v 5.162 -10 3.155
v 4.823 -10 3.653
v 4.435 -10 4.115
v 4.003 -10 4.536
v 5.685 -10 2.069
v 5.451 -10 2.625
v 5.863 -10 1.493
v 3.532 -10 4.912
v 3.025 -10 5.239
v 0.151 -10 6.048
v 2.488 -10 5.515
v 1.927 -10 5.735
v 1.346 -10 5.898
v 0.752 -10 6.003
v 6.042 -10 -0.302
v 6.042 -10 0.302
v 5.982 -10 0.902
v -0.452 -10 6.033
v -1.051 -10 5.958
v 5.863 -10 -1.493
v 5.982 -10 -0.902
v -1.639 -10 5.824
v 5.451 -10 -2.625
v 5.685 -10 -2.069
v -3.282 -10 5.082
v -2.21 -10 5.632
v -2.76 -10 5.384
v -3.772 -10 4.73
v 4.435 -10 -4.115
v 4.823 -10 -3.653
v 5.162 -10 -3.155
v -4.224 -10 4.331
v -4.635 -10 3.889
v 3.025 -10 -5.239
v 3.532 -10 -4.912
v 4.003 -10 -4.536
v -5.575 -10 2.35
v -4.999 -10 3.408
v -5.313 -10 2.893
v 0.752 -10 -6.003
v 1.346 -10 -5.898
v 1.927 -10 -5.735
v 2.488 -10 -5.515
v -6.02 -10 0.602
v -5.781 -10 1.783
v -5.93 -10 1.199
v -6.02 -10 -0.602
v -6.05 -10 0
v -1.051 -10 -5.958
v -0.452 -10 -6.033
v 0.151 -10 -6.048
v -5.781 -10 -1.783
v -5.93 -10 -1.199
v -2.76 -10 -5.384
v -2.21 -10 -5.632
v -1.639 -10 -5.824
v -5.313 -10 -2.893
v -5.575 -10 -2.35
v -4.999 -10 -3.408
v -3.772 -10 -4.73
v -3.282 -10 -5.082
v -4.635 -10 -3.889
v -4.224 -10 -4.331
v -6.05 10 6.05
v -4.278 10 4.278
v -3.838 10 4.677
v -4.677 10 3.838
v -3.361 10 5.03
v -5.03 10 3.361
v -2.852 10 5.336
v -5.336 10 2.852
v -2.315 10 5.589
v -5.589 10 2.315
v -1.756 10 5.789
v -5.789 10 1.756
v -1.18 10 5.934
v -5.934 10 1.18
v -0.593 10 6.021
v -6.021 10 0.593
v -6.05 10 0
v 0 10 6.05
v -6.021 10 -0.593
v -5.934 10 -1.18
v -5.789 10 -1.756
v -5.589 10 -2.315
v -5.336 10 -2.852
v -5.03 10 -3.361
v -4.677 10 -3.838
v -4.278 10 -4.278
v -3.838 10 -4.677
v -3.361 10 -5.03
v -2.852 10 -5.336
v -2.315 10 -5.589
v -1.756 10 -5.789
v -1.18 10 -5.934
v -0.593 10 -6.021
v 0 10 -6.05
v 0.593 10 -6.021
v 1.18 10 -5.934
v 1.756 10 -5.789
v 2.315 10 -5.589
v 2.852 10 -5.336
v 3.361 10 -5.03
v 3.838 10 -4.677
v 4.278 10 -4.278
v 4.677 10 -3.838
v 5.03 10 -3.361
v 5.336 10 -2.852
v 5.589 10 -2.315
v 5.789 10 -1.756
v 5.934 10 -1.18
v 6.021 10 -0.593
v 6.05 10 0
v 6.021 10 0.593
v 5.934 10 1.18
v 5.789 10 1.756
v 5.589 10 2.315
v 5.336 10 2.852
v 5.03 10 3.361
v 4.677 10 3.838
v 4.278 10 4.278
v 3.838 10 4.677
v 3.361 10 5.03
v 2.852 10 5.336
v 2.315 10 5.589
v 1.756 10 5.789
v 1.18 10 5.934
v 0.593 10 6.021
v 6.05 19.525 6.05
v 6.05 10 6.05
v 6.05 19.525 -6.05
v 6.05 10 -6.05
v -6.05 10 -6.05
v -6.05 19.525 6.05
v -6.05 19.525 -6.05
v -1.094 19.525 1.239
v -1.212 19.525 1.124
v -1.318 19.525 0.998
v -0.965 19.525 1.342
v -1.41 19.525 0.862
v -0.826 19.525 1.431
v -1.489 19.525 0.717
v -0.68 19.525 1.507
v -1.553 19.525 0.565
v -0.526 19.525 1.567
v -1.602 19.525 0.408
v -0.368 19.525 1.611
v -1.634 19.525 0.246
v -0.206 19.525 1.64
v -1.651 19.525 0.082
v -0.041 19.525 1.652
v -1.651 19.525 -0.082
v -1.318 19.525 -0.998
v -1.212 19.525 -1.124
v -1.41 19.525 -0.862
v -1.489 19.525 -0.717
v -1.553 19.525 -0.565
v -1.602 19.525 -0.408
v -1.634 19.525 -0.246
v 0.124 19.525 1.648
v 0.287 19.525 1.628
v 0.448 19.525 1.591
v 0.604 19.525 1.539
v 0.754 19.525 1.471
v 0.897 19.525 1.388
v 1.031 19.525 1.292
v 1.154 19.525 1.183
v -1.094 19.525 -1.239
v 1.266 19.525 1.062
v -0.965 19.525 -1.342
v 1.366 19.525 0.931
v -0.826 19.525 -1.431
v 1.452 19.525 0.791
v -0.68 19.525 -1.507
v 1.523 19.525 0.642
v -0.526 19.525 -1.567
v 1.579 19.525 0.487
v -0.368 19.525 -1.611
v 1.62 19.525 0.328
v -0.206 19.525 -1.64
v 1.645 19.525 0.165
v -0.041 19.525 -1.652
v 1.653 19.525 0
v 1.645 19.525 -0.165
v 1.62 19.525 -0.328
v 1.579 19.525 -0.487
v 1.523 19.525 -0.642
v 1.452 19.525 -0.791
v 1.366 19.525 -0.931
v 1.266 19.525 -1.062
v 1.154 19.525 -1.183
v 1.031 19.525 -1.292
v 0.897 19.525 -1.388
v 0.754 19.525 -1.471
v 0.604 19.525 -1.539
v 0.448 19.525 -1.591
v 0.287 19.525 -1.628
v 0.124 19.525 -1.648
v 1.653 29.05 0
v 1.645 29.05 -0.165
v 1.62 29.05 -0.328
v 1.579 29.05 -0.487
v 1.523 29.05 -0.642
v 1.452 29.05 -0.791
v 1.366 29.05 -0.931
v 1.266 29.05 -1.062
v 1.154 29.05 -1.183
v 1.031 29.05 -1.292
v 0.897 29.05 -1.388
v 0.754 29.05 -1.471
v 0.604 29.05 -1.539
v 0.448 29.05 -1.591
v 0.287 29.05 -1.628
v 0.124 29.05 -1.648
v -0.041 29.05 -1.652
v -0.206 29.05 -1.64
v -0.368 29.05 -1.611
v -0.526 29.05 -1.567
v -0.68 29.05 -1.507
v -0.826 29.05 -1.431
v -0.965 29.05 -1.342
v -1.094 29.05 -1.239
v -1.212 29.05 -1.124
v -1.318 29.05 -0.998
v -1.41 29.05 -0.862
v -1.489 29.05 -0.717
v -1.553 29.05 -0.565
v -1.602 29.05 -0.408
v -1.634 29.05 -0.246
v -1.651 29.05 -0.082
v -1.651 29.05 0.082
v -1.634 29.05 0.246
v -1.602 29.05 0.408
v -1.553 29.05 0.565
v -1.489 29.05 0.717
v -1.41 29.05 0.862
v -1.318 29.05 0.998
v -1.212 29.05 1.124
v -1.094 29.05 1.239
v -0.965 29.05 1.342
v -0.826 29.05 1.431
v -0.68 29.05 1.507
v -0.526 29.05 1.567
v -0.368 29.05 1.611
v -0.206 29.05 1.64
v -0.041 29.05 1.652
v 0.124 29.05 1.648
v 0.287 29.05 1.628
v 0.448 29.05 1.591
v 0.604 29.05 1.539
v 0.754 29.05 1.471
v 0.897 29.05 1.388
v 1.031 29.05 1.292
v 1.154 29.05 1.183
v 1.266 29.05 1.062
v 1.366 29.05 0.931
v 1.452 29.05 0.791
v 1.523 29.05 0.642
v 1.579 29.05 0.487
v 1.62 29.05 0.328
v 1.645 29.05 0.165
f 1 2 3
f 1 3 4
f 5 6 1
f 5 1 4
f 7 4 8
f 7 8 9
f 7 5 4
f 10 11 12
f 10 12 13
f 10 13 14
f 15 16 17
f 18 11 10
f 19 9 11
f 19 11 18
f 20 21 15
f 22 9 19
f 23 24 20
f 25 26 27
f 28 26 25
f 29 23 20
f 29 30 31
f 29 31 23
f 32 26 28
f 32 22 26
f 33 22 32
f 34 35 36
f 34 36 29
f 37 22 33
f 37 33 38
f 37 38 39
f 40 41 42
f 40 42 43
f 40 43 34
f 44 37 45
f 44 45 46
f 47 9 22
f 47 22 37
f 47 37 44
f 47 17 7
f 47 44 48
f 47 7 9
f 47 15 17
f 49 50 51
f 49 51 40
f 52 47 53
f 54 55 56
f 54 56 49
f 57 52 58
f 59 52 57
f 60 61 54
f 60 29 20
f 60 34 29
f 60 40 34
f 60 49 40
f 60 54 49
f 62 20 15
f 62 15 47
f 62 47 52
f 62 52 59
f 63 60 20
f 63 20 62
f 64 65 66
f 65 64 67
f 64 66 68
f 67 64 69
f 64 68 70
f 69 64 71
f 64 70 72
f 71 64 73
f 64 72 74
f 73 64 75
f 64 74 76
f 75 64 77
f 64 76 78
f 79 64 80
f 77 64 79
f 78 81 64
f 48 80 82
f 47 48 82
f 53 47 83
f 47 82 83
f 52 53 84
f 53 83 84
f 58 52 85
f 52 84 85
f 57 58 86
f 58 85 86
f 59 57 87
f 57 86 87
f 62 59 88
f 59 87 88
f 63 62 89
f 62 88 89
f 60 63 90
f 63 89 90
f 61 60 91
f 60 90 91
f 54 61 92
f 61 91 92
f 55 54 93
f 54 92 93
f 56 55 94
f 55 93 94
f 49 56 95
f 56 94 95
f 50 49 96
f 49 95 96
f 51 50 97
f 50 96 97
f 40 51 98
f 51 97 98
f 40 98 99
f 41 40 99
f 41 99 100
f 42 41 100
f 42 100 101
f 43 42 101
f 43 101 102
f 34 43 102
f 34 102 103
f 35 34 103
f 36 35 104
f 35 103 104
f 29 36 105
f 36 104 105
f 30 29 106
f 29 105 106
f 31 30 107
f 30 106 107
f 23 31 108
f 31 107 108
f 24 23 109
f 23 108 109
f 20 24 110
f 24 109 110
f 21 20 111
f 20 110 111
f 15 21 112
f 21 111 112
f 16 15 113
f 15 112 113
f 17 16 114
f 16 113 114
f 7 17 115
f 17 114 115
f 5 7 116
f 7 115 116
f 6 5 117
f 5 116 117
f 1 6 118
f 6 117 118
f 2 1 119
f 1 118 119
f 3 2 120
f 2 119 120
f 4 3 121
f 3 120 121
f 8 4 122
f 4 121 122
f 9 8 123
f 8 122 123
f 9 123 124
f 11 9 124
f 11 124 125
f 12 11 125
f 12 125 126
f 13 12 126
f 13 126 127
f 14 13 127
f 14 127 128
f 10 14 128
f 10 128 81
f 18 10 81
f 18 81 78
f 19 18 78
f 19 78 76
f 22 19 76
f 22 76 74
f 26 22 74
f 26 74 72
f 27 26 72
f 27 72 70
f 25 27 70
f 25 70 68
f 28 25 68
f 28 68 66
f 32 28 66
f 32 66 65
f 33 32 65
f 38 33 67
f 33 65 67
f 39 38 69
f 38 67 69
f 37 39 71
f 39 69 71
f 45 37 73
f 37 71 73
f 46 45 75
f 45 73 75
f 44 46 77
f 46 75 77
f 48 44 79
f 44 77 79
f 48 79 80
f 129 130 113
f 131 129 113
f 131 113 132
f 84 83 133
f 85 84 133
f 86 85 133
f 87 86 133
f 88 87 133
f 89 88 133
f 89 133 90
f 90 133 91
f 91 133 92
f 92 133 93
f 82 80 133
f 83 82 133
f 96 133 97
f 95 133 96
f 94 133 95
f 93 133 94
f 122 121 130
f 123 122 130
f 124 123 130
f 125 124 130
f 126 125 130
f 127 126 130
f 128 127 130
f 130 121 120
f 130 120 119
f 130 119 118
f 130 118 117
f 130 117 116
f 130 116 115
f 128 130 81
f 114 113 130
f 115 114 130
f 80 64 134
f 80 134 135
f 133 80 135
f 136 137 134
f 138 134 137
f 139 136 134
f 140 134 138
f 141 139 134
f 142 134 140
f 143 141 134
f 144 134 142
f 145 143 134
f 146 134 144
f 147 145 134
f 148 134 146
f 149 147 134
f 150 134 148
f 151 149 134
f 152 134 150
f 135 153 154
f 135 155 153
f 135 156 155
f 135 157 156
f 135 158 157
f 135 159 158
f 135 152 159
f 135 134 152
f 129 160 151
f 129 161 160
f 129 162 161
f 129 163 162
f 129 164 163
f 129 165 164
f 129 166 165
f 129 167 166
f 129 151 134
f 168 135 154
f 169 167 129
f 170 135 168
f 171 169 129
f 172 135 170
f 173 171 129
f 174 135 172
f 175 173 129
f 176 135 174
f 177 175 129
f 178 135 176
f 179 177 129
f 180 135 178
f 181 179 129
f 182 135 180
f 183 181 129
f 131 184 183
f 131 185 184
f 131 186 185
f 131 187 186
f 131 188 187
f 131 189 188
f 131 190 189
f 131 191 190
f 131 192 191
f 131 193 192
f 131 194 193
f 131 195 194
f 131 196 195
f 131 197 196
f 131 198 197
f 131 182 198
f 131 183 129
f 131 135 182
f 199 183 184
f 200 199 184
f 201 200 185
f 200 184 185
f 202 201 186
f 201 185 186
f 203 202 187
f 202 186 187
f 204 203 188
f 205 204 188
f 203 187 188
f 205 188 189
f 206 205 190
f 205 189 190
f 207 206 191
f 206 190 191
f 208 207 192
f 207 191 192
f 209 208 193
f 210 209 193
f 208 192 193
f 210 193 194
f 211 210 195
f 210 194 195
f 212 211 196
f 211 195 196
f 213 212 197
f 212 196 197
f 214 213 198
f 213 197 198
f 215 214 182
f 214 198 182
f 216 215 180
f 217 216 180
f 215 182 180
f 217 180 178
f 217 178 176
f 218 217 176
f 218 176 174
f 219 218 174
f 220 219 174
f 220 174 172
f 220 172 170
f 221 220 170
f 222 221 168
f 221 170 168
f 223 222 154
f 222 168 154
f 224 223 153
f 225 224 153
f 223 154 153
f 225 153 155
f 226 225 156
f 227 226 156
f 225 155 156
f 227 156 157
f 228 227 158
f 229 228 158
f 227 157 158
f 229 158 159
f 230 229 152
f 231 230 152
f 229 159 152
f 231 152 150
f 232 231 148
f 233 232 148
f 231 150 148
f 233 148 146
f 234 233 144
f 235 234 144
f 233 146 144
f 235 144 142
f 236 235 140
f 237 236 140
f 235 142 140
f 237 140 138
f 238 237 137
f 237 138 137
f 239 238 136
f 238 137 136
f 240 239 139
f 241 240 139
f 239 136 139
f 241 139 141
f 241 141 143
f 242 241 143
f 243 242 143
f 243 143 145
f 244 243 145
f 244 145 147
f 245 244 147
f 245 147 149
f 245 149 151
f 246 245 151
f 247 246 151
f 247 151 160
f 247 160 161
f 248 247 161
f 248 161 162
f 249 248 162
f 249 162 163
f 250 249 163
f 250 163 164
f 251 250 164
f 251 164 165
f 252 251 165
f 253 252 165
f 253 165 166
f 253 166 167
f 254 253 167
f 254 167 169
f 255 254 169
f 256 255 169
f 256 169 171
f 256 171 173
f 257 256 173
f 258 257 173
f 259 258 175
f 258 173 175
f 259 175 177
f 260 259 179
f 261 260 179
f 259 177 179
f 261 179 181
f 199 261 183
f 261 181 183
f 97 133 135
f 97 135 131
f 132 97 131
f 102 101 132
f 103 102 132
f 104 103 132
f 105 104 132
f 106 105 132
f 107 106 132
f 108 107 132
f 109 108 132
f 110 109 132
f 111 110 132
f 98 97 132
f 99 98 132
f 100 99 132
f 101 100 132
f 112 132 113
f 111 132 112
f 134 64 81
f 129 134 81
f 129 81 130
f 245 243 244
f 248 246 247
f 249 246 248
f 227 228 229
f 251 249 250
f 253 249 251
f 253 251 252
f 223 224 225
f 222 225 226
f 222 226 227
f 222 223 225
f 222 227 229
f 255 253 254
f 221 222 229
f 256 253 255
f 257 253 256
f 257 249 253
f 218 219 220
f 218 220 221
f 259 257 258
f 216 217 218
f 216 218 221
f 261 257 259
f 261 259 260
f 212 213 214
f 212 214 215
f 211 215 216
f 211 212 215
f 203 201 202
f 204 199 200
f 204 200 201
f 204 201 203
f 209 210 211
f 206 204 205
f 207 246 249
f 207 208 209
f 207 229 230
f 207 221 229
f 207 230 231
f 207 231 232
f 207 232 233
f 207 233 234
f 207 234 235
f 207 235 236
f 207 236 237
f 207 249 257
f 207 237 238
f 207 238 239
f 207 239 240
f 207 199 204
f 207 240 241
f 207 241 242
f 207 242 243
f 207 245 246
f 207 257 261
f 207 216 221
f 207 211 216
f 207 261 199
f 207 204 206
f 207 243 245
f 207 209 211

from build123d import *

# Parameters (mm, degrees)
SKETCH1_W           = 6.05
SKETCH1_H           = 20
SKETCH2_W           = 12.1
SKETCH2_H           = 12.1
BOSS_EXTRUDE1_DEPTH = 9.525
SKETCH3_R           = 1.652922186
BOSS_EXTRUDE2_DEPTH = 9.525


with BuildPart() as part:
    # Sketch1 → Revolve1 (revolve)
    with BuildSketch(Plane.XY):
        with Locations((-3.025, 0)):
            Rectangle(SKETCH1_W, SKETCH1_H)
    revolve(axis=Axis((0, 10, 0), (0, -1, 0)))

    # Sketch2 → Boss-Extrude1 (add)
    with BuildSketch(Plane(origin=(0, 10, 0), x_dir=(1, 0, 0), z_dir=(0, 1, 0))):
        Rectangle(SKETCH2_W, SKETCH2_H)
    extrude(amount=BOSS_EXTRUDE1_DEPTH)

    # Sketch3 → Boss-Extrude2 (add)
    with BuildSketch(Plane(origin=(0, 19.525, 0), x_dir=(1, 0, 0), z_dir=(0, 1, 0))):
        Circle(SKETCH3_R)
    extrude(amount=BOSS_EXTRUDE2_DEPTH)


solid = part.part
